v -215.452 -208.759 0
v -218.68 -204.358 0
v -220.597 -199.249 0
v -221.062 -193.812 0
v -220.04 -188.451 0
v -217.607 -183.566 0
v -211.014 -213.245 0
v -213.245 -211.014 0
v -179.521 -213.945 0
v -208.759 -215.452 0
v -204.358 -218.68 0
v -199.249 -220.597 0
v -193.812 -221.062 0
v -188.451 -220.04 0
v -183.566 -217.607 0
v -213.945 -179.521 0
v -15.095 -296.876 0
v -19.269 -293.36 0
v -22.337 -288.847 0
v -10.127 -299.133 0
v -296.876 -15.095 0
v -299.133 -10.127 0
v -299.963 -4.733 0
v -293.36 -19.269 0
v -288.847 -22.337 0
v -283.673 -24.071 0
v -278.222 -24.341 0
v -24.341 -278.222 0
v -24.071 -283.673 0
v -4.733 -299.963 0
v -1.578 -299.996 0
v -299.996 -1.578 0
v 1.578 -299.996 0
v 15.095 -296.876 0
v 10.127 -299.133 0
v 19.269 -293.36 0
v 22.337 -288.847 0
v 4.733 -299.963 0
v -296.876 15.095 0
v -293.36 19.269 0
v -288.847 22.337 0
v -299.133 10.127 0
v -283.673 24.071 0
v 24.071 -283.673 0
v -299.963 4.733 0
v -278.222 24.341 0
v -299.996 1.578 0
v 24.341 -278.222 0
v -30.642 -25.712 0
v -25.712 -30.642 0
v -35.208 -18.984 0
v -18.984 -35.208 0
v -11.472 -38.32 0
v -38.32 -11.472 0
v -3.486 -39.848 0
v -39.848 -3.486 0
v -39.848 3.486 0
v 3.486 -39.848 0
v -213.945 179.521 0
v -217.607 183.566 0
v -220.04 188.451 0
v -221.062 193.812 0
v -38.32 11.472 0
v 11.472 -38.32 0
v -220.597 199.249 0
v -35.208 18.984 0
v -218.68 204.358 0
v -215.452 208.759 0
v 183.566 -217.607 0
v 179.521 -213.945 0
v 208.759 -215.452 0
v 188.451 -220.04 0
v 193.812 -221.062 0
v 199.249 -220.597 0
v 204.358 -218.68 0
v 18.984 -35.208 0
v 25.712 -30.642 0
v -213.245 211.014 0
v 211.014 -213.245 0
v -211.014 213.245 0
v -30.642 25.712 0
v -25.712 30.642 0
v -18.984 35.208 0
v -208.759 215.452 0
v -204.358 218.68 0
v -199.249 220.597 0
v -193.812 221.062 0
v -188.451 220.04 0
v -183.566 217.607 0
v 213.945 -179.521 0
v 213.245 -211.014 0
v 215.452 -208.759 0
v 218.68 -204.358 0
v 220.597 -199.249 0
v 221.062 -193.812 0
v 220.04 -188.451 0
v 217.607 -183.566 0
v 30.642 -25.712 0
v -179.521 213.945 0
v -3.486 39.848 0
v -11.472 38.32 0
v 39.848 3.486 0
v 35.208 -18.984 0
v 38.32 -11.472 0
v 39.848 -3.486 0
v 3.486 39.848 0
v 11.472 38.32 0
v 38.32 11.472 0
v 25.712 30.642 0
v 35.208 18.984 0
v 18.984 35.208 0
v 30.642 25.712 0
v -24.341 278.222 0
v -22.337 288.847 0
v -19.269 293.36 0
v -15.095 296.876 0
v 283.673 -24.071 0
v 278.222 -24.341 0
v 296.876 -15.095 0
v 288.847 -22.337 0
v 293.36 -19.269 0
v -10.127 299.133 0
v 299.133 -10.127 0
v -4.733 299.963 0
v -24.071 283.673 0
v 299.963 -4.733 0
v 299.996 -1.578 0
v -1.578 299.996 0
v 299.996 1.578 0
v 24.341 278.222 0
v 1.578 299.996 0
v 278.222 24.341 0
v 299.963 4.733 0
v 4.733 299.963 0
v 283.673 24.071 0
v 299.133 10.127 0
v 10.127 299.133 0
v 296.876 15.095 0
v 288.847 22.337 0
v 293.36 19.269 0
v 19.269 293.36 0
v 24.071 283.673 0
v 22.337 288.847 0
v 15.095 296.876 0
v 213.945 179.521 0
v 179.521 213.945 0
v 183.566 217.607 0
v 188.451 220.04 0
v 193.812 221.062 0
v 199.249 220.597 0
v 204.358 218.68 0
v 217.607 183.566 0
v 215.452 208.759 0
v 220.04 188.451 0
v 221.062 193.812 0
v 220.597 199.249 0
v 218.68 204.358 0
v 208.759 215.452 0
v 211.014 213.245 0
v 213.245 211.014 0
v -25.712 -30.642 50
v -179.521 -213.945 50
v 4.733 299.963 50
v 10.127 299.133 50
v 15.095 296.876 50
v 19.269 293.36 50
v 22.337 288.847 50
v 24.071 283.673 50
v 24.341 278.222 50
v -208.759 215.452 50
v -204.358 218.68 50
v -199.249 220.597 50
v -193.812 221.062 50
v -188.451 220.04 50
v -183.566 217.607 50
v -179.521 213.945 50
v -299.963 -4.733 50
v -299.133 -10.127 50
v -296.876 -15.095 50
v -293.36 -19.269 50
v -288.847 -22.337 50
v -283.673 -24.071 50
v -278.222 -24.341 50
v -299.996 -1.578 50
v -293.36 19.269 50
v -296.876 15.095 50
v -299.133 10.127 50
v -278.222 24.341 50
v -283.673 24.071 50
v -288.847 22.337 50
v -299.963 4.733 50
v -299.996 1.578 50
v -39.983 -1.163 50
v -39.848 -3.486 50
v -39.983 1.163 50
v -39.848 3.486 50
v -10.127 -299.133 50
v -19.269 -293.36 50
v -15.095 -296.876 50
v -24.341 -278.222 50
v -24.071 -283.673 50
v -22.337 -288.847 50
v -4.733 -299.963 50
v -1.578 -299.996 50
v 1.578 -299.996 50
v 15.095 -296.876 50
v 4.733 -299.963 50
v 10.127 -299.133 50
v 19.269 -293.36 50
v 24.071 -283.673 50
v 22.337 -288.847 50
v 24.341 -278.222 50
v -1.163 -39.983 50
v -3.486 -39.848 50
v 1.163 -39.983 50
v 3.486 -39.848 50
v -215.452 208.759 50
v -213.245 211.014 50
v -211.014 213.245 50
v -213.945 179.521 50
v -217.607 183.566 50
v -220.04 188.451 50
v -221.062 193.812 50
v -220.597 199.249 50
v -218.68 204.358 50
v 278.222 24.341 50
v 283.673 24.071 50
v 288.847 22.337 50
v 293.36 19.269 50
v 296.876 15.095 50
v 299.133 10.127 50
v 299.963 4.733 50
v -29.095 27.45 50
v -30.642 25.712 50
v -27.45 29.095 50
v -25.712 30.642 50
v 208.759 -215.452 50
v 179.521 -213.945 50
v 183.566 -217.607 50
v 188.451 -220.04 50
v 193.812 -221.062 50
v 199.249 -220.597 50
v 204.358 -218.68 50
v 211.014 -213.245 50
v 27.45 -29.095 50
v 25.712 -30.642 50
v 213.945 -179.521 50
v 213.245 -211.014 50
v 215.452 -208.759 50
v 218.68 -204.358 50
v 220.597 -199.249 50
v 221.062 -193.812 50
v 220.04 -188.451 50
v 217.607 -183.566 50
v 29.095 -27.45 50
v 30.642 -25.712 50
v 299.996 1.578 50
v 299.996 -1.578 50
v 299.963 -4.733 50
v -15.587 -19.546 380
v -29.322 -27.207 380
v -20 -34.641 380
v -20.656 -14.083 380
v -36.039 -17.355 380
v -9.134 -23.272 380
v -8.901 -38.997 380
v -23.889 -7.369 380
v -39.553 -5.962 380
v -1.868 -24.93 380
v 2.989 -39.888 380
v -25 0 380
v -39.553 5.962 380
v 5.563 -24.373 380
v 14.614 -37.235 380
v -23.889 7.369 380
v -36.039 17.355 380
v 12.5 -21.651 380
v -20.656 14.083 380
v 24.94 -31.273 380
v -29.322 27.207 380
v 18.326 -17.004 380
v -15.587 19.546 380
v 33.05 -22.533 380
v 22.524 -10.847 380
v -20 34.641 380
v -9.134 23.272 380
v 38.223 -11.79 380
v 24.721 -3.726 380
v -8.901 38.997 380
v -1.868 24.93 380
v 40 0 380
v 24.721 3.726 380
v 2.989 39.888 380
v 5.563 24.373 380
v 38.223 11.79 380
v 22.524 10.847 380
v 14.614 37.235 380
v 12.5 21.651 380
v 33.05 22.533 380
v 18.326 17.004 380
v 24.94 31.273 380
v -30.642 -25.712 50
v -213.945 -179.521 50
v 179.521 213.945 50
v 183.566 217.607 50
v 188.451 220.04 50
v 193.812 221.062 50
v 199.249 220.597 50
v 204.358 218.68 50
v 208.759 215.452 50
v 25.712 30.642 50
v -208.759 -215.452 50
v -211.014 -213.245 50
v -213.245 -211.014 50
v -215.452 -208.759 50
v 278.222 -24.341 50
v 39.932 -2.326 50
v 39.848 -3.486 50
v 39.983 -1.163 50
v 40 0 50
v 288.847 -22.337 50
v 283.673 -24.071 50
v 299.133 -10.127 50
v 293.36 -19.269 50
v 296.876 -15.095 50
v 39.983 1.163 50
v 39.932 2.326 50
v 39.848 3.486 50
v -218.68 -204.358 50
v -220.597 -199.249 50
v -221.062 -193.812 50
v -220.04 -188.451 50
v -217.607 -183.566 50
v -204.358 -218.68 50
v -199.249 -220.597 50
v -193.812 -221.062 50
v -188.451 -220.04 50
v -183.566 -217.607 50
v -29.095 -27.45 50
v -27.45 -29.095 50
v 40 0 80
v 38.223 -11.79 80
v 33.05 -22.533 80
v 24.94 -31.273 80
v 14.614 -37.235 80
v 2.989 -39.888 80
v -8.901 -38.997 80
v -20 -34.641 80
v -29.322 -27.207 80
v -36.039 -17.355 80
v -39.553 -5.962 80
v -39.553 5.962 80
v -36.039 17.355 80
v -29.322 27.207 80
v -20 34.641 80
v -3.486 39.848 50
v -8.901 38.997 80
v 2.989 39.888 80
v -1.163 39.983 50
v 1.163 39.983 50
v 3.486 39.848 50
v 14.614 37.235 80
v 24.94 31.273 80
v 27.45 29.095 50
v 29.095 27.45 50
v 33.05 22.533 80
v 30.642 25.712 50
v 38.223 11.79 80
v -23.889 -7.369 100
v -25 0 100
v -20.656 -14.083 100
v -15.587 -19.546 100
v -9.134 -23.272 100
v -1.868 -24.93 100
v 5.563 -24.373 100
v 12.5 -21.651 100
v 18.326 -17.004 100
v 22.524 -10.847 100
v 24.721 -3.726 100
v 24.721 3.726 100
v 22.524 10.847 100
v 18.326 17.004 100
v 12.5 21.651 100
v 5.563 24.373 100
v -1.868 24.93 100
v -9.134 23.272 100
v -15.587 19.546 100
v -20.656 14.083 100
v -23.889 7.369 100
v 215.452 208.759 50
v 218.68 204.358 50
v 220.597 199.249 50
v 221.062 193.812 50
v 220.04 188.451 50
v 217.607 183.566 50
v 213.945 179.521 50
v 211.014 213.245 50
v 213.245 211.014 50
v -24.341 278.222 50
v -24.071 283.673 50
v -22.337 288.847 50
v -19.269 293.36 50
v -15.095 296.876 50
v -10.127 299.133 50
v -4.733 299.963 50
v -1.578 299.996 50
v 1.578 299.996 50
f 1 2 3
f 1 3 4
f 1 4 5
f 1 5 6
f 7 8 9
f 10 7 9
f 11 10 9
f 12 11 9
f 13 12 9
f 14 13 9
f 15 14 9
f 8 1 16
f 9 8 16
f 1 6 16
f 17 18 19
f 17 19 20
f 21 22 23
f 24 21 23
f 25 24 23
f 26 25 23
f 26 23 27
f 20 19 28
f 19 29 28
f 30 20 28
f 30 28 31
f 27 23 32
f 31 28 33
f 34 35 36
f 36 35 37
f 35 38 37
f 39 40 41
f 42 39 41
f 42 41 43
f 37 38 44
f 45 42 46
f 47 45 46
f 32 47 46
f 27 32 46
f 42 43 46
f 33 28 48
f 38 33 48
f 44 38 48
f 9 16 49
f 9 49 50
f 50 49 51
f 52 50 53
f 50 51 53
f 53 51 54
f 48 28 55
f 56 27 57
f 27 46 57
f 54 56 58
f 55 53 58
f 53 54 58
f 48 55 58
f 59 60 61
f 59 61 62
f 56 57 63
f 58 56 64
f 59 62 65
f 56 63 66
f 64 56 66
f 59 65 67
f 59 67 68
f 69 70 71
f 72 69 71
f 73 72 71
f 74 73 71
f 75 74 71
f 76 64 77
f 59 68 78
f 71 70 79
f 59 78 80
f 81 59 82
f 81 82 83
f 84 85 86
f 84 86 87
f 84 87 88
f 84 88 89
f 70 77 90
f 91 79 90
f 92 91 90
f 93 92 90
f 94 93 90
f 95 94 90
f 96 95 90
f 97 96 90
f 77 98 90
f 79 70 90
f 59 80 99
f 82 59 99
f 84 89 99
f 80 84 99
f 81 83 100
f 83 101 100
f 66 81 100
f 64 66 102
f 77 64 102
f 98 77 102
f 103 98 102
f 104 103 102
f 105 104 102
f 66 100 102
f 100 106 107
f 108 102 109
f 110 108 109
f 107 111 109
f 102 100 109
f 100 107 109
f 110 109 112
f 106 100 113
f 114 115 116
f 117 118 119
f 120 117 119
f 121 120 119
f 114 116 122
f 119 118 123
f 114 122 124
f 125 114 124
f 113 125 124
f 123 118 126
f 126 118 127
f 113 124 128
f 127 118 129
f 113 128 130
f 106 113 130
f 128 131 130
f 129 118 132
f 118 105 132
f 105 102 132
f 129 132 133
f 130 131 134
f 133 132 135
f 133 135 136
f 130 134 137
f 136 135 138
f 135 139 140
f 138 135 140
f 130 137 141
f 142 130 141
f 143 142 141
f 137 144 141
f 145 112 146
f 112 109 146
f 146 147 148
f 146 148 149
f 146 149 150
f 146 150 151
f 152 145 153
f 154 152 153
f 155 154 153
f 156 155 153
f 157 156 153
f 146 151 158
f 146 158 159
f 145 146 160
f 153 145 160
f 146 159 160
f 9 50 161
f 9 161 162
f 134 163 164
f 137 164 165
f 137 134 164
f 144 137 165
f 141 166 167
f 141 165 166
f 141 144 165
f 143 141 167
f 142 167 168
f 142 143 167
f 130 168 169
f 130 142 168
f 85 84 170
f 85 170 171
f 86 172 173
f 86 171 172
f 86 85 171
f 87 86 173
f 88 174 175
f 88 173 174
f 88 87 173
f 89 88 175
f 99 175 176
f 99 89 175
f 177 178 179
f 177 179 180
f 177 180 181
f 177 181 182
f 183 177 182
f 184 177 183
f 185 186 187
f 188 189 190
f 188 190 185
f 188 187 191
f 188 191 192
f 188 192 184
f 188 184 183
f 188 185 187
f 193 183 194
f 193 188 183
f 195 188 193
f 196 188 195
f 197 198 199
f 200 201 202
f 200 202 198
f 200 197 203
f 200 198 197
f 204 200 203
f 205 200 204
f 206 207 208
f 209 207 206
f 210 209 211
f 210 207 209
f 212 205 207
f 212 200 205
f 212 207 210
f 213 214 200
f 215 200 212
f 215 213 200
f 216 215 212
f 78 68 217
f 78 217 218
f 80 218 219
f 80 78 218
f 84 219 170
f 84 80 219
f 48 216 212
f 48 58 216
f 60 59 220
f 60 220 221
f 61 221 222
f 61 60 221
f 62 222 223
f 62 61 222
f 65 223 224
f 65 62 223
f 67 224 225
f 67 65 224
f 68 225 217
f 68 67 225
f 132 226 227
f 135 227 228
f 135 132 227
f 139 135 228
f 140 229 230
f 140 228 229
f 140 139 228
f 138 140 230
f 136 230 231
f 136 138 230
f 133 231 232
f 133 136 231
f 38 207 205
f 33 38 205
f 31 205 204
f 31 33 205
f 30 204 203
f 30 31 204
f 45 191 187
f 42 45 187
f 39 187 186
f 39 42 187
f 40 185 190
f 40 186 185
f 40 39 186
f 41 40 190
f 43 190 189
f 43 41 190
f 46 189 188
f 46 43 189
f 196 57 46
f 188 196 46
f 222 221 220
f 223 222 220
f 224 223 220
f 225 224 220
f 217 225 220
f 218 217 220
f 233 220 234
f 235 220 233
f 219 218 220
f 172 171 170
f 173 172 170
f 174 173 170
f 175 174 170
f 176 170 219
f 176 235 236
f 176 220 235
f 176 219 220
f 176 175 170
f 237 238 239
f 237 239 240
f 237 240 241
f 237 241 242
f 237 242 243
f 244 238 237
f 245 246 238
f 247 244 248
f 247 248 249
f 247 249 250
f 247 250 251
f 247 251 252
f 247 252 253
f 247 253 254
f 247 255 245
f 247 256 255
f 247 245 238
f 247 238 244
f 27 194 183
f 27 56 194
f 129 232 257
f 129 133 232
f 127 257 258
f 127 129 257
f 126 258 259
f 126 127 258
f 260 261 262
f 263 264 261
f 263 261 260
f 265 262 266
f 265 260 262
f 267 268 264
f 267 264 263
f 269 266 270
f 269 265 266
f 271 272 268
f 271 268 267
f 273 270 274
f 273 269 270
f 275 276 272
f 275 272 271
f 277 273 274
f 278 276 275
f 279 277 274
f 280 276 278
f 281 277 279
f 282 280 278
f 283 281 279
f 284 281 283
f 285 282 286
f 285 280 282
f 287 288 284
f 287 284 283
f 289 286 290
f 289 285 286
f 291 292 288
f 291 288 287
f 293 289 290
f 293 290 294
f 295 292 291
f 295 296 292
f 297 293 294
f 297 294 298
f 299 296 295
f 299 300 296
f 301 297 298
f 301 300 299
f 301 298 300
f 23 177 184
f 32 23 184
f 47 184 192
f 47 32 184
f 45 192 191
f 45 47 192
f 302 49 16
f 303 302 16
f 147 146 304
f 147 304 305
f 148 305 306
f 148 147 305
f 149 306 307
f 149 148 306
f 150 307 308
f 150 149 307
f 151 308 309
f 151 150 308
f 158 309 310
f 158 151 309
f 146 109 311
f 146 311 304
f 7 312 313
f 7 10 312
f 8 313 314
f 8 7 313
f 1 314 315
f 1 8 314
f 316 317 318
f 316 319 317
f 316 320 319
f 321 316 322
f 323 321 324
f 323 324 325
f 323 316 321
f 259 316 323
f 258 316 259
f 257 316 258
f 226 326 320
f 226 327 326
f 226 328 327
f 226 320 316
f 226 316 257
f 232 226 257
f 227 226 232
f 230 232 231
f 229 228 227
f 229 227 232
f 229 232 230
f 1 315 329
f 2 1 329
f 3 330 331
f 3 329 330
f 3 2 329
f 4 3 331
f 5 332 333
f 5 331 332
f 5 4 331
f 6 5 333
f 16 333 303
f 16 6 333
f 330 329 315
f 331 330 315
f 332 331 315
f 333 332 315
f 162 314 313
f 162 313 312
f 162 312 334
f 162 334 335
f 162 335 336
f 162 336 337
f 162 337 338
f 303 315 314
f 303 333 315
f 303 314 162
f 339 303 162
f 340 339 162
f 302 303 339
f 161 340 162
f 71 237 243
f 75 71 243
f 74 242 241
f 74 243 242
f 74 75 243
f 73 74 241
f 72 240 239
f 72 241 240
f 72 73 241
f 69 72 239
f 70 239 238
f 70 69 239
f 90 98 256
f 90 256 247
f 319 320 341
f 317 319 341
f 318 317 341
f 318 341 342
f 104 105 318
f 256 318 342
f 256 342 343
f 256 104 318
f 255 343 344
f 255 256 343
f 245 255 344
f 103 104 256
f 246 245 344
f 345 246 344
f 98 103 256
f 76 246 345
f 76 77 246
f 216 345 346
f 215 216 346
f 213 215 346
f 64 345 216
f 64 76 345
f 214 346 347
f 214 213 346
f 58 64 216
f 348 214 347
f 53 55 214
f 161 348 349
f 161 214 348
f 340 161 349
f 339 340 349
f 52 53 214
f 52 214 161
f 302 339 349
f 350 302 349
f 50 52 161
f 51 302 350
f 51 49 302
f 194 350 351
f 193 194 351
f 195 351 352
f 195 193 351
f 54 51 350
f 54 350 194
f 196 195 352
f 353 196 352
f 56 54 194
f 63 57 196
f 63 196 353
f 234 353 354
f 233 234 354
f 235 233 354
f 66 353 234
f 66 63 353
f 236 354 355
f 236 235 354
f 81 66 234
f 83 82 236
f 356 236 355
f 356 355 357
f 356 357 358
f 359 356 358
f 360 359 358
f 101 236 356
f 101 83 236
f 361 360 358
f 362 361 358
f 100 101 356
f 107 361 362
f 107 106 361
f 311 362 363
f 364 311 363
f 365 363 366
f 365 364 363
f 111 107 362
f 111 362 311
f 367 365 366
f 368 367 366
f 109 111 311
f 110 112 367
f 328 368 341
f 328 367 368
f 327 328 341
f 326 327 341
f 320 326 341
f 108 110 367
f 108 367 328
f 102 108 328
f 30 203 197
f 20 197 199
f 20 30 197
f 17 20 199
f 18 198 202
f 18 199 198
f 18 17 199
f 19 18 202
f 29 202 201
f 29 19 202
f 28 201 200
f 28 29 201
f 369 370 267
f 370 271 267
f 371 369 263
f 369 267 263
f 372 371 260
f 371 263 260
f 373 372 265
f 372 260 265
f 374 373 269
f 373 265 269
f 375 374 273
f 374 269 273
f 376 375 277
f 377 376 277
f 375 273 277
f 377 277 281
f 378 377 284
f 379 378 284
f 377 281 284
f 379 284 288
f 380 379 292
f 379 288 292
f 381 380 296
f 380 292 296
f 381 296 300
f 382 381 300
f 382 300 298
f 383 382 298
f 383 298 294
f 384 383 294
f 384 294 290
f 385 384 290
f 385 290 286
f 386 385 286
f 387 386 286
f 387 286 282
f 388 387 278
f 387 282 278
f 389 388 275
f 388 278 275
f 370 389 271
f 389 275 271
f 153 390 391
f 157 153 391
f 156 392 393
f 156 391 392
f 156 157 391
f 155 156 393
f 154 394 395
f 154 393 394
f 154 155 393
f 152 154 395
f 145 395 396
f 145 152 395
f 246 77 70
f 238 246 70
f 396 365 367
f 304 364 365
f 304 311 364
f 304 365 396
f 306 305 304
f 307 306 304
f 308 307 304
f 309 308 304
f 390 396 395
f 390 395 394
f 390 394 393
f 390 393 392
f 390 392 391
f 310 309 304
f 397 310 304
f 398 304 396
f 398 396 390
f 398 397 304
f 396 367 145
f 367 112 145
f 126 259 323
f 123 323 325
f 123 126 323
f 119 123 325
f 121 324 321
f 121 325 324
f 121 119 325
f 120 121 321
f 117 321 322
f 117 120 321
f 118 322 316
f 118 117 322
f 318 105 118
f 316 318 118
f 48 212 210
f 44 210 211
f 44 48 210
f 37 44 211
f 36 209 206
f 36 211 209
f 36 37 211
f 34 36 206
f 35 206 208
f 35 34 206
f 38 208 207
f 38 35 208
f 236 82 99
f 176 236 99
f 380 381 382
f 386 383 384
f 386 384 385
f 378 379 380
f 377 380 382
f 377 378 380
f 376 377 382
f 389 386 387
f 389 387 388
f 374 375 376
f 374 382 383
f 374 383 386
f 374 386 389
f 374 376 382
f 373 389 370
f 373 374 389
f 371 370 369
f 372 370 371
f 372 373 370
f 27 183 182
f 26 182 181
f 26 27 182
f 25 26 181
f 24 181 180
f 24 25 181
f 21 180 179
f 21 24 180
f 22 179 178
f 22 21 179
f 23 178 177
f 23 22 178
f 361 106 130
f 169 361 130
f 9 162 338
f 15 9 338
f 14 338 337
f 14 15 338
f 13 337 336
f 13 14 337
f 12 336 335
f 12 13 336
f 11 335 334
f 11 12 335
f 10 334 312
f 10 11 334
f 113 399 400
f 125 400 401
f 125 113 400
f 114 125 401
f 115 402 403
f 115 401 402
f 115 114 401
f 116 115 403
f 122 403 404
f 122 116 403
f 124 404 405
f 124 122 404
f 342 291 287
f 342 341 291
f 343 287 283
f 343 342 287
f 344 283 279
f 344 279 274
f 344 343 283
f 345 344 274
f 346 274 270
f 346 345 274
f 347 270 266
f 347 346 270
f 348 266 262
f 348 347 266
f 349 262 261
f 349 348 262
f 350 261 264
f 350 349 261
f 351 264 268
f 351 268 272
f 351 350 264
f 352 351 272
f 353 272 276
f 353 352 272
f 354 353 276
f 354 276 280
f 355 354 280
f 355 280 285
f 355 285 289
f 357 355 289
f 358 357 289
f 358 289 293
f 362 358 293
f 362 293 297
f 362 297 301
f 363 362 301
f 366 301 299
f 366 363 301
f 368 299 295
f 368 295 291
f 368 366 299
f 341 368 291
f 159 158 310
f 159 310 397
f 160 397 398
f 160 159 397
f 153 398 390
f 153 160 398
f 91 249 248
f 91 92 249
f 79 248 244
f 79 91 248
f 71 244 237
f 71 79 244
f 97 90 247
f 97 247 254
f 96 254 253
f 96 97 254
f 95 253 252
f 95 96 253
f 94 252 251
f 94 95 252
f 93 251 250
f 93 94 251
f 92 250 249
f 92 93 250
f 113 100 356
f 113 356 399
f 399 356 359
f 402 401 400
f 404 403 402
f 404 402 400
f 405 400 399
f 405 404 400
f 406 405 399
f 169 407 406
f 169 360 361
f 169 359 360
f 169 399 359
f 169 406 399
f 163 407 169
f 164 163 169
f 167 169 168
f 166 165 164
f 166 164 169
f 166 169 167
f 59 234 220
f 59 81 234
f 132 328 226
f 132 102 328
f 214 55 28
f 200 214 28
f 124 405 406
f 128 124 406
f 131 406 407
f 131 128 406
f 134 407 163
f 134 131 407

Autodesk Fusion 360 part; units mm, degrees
sketch "Sketch1" plane through (0, 0, 0) normal (0, 0, 1) x (1, 0, 0)
  circle A0 centre (0, 0) radius 40
  line L0 (39.8478, 3.4862) -> (278.222, 24.3413)
  line L1 (0, 0) -> (300, 0) construction
  line L2 (39.8478, -3.4862) -> (278.222, -24.3413)
  arc A1 (299.9627, -4.7329) -> (299.9627, 4.7329) centre (0, 0) ccw
  arc A2 (299.9627, 4.7329) -> (278.222, 24.3413) centre (279.9652, 4.4174) ccw
  arc A3 (278.222, -24.3413) -> (299.9627, -4.7329) centre (279.9652, -4.4174) ccw
  line L3 (25.7115, 30.6418) -> (179.5208, 213.9446)
  line L4 (30.6418, 25.7115) -> (213.9446, 179.5208)
  arc A4 (213.9446, 179.5208) -> (215.4523, 208.759) centre (201.0888, 194.8417) ccw
  arc A5 (215.4523, 208.759) -> (208.759, 215.4523) centre (0, 0) ccw
  arc A6 (208.759, 215.4523) -> (179.5208, 213.9446) centre (194.8417, 201.0888) ccw
  line L5 (-3.4862, 39.8478) -> (-24.3413, 278.222)
  line L6 (3.4862, 39.8478) -> (24.3413, 278.222)
  arc A7 (24.3413, 278.222) -> (4.7329, 299.9627) centre (4.4174, 279.9652) ccw
  arc A8 (4.7329, 299.9627) -> (-4.7329, 299.9627) centre (0, 0) ccw
  arc A9 (-4.7329, 299.9627) -> (-24.3413, 278.222) centre (-4.4174, 279.9652) ccw
  line L7 (-30.6418, 25.7115) -> (-213.9446, 179.5208)
  line L8 (-25.7115, 30.6418) -> (-179.5208, 213.9446)
  arc A10 (-179.5208, 213.9446) -> (-208.759, 215.4523) centre (-194.8417, 201.0888) ccw
  arc A11 (-208.759, 215.4523) -> (-215.4523, 208.759) centre (0, 0) ccw
  arc A12 (-215.4523, 208.759) -> (-213.9446, 179.5208) centre (-201.0888, 194.8417) ccw
  line L9 (-39.8478, -3.4862) -> (-278.222, -24.3413)
  line L10 (-39.8478, 3.4862) -> (-278.222, 24.3413)
  arc A13 (-278.222, 24.3413) -> (-299.9627, 4.7329) centre (-279.9652, 4.4174) ccw
  arc A14 (-299.9627, 4.7329) -> (-299.9627, -4.7329) centre (0, 0) ccw
  arc A15 (-299.9627, -4.7329) -> (-278.222, -24.3413) centre (-279.9652, -4.4174) ccw
  line L11 (-25.7115, -30.6418) -> (-179.5208, -213.9446)
  line L12 (-30.6418, -25.7115) -> (-213.9446, -179.5208)
  arc A16 (-213.9446, -179.5208) -> (-215.4523, -208.759) centre (-201.0888, -194.8417) ccw
  arc A17 (-215.4523, -208.759) -> (-208.759, -215.4523) centre (0, 0) ccw
  arc A18 (-208.759, -215.4523) -> (-179.5208, -213.9446) centre (-194.8417, -201.0888) ccw
  line L13 (3.4862, -39.8478) -> (24.3413, -278.222)
  line L14 (-3.4862, -39.8478) -> (-24.3413, -278.222)
  arc A19 (-24.3413, -278.222) -> (-4.7329, -299.9627) centre (-4.4174, -279.9652) ccw
  arc A20 (-4.7329, -299.9627) -> (4.7329, -299.9627) centre (0, 0) ccw
  arc A21 (4.7329, -299.9627) -> (24.3413, -278.222) centre (4.4174, -279.9652) ccw
  line L15 (30.6418, -25.7115) -> (213.9446, -179.5208)
  line L16 (25.7115, -30.6418) -> (179.5208, -213.9446)
  arc A22 (179.5208, -213.9446) -> (208.759, -215.4523) centre (194.8417, -201.0888) ccw
  arc A23 (208.759, -215.4523) -> (215.4523, -208.759) centre (0, 0) ccw
  arc A24 (215.4523, -208.759) -> (213.9446, -179.5208) centre (201.0888, -194.8417) ccw
  point P0 (298.8584, 26.1467)
  dimension "d1" = 80
  dimension "d3" = 5
  dimension "d4" = 300
  dimension "d5" = 20
  dimension "d6" = 20
  dimension "d8" = 360
extrude "Extrude1" add sketch "Sketch1" along normal blind 50 contours A0 L0 L2 A1 A2 A3 | A0 L3 L4 A4 A5 A6 | A0 L15 L16 A22 A23 A24 | A0 L5 L6 A7 A8 A9 | A0 L13 L14 A19 A20 A21 | A0 L7 L8 A10 A11 A12 | A0 L11 L12 A16 A17 A18 | A0 L9 L10 A13 A14 A15 makes body 1 at (-10.4379, 119.3059, 16.6667) makes body 2 at (10.4379, -119.3059, 16.6667) makes body 3 at (-76.9813, -91.7427, 16.6667) makes body 4 at (91.7427, 76.9813, 16.6667) makes body 5 at (-91.7427, 76.9813, 16.6667) makes body 6 at (76.9813, -91.7427, 16.6667) makes body 7 at (-119.3059, -10.4379, 16.6667) makes body 8 at (119.3059, 10.4379, 16.6667)
extrude "Extrude2" add sketch "Sketch1" along normal blind 80 contours A0 bodies 1 2 3 4 5 6 7 8
extrude "Extrude3" add 1 faces at (13.1844, -1.9872, 80) along direction (0, 0, 1) blind 300 on bodies 1 bodies 1
sketch "Sketch2" plane through (0, 0, 380) normal (0, 0, 1) x (-1, 0, 0)
  circle A0 centre (0, 0) radius 40
  circle A1 centre (0, 0) radius 25
  dimension "d15" = 50
extrude "Extrude4" cut sketch "Sketch2" against normal blind 280 contours A1 bodies 1
